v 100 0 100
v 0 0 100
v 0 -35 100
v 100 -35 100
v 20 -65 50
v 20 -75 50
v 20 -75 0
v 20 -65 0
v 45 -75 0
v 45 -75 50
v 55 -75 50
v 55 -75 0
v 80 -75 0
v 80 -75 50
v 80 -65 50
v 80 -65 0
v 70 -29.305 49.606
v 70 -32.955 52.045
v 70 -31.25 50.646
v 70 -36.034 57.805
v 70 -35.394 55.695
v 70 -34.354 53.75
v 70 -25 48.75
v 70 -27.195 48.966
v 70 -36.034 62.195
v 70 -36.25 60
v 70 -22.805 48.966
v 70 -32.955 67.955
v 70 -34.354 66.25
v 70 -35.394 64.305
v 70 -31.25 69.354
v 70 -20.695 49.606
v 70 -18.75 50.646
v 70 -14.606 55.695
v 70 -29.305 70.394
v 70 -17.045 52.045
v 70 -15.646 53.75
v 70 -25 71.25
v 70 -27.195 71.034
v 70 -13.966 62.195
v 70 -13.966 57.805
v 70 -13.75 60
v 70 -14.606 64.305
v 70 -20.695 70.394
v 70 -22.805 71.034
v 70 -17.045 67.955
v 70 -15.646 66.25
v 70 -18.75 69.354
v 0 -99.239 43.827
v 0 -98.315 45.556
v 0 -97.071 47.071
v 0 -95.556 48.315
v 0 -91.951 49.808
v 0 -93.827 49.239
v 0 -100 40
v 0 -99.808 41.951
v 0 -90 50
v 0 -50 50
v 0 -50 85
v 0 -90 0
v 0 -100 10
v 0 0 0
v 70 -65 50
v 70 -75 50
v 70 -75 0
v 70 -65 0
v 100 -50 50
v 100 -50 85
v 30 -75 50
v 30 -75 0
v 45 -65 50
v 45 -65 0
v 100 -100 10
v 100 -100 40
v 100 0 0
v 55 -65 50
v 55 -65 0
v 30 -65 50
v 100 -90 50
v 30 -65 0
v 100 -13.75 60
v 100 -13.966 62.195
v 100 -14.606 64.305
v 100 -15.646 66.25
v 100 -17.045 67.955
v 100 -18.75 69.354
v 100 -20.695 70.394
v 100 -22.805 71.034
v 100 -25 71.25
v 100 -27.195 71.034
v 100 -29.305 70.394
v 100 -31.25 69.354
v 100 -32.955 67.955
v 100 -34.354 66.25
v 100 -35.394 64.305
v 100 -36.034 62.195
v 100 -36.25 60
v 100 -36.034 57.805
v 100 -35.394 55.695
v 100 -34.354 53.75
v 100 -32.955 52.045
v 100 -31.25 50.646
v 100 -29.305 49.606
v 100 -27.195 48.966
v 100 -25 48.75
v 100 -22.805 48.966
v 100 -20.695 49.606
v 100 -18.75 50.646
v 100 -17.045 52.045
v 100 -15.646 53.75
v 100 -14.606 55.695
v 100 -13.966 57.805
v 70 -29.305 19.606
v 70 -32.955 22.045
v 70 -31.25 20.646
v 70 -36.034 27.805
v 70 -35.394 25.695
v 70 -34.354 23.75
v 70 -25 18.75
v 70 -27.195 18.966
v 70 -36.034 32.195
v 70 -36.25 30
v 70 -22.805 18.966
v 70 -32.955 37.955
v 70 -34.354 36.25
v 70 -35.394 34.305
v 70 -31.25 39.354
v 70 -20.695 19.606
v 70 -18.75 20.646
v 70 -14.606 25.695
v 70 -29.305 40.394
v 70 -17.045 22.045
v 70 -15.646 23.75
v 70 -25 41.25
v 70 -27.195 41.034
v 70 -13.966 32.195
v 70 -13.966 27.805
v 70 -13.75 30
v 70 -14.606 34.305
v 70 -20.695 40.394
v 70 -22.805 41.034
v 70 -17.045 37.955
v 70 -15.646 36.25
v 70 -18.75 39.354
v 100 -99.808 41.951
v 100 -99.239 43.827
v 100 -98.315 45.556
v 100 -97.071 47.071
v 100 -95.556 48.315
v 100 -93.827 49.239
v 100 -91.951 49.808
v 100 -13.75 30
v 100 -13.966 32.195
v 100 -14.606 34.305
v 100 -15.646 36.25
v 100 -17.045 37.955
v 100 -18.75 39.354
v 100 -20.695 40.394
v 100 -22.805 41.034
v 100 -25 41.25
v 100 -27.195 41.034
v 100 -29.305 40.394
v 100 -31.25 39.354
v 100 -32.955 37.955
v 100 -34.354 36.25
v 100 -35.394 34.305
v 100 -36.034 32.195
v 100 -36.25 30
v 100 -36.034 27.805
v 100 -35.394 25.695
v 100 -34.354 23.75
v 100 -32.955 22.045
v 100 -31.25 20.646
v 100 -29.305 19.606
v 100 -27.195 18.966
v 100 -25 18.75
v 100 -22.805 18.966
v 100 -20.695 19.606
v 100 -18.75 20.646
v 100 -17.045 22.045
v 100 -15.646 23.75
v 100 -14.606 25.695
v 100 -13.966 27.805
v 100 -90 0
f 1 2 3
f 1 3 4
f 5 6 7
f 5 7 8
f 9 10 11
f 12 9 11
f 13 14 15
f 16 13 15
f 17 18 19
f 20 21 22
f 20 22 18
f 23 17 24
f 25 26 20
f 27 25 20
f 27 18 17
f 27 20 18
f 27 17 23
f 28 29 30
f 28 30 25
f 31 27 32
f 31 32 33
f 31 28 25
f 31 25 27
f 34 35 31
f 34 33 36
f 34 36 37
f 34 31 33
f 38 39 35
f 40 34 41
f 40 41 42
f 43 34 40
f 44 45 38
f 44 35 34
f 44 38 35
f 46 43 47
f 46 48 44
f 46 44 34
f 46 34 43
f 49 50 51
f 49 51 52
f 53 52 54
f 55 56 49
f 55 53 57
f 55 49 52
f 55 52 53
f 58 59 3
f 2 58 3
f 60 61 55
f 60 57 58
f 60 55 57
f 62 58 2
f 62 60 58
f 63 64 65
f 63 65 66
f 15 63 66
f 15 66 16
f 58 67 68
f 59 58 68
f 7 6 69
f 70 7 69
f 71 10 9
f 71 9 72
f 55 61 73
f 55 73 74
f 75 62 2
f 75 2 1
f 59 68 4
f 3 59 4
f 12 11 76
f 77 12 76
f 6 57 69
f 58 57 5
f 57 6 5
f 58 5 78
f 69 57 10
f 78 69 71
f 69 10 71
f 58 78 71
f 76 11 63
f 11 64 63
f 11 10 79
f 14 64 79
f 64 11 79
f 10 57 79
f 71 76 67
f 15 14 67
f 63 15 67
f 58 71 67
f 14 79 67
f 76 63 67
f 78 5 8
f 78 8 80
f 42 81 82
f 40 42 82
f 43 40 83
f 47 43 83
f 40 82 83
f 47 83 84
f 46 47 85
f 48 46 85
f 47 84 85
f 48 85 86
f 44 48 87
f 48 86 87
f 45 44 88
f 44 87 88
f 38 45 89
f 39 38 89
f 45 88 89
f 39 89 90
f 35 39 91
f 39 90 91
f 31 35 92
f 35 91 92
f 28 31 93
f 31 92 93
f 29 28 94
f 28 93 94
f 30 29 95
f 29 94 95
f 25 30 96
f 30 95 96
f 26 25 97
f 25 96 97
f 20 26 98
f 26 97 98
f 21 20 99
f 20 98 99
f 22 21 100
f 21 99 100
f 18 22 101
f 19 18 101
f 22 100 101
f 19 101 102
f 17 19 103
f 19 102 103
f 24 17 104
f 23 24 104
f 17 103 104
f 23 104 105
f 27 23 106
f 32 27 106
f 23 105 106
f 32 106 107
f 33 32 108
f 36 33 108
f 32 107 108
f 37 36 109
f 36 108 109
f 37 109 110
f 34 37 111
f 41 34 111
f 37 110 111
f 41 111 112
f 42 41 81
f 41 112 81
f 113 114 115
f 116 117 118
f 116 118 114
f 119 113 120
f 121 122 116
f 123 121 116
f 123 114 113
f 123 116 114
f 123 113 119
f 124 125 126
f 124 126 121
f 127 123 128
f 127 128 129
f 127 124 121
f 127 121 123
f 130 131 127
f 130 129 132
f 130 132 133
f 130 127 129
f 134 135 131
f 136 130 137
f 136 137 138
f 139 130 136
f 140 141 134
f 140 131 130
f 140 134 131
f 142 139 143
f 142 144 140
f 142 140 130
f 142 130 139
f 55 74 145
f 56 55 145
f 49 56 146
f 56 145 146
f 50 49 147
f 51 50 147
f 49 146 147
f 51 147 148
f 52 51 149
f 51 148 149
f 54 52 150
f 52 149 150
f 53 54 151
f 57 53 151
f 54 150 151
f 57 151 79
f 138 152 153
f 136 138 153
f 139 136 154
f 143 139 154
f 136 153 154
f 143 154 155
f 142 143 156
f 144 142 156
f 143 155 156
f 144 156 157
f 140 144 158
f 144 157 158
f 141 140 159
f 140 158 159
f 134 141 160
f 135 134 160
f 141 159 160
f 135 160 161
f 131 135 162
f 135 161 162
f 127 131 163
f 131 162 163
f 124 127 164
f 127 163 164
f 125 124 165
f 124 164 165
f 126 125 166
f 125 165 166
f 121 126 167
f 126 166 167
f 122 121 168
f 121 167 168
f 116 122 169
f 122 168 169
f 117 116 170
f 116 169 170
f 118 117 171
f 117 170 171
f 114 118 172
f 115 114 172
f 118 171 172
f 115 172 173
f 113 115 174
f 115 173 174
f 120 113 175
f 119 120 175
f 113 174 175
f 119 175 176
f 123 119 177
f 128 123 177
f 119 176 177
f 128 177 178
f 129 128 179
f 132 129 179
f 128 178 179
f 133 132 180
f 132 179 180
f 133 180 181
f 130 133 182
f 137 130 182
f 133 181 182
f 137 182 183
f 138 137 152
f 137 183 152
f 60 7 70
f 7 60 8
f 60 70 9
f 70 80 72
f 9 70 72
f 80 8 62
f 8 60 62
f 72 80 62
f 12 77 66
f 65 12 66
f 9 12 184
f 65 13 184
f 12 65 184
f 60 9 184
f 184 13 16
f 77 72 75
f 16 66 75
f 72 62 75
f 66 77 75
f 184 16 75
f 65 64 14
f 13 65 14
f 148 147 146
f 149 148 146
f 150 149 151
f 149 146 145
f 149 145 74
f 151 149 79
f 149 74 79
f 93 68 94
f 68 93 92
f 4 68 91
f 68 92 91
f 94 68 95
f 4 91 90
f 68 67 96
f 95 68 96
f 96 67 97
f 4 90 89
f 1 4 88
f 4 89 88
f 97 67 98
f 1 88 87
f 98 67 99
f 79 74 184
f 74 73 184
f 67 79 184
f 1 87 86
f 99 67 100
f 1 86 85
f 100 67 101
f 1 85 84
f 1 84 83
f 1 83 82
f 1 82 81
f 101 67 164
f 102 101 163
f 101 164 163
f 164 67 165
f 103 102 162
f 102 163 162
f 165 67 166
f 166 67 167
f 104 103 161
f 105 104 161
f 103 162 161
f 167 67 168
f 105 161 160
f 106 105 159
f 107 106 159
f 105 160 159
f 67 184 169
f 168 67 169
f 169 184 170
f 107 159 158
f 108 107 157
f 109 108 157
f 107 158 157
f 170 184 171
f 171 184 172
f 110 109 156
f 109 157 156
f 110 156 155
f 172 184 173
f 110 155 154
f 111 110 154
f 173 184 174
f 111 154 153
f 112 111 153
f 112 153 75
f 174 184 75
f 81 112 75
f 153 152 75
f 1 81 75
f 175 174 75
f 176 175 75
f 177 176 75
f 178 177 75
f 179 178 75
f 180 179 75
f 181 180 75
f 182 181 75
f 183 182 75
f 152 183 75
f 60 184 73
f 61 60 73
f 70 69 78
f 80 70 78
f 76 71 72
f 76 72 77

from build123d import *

# Parameters (mm, degrees)
F0_W     = 100
F0_H     = 100
F1_DEPTH = 100
F3_DEPTH = 100
F4_R     = 11.25
F5_DEPTH = 30
F6_W     = 10
F6_H     = 10
F7_DEPTH = 50


with BuildPart() as f1:
    # F0 (on Top) → F1 (new body)
    with BuildSketch(Plane.XY):
        with Locations((50, -50)):
            Rectangle(F0_W, F0_H)
    extrude(amount=F1_DEPTH)

    # F2 (on face) → F3 (cut)
    with BuildSketch(Plane.YZ.offset(100)):
        with BuildLine():
            Line((-88.576018, -5.630251), (-90, 0))
            Line((-90, 0), (-100, 10))
            Line((-100, 10), (-100, 40))
            ThreePointArc((-100, 40), (-97.071068, 47.071068), (-90, 50))
            Line((-90, 50), (-50, 50))
            Line((-50, 50), (-50, 85))
            Line((-50, 85), (-35, 100))
            Line((-35, 100), (-35, 130.032703))
            Line((-35, 130.032703), (-148.719932, 130.032703))
            Line((-148.719932, 130.032703), (-148.719932, -5.630251))
            Line((-148.719932, -5.630251), (-88.576018, -5.630251))
        make_face()
    extrude(amount=-F3_DEPTH, mode=Mode.SUBTRACT)

    # F4 (on face) → F5 (cut)
    with BuildSketch(Plane.YZ.offset(100)):
        with Locations((-25, 60)):
            Circle(F4_R)
        with Locations((-25, 30)):
            Circle(F4_R)
    extrude(amount=-F5_DEPTH, mode=Mode.SUBTRACT)

    # F6 (on face) → F7 (cut)
    with BuildSketch(Plane.XY.offset(50)):
        with Locations((25, -70)):
            Rectangle(F6_W, F6_H)
        with Locations((50, -70)):
            Rectangle(F6_W, F6_H)
        with Locations((75, -70)):
            Rectangle(F6_W, F6_H)
    extrude(amount=-F7_DEPTH, mode=Mode.SUBTRACT)


solid = f1.part
